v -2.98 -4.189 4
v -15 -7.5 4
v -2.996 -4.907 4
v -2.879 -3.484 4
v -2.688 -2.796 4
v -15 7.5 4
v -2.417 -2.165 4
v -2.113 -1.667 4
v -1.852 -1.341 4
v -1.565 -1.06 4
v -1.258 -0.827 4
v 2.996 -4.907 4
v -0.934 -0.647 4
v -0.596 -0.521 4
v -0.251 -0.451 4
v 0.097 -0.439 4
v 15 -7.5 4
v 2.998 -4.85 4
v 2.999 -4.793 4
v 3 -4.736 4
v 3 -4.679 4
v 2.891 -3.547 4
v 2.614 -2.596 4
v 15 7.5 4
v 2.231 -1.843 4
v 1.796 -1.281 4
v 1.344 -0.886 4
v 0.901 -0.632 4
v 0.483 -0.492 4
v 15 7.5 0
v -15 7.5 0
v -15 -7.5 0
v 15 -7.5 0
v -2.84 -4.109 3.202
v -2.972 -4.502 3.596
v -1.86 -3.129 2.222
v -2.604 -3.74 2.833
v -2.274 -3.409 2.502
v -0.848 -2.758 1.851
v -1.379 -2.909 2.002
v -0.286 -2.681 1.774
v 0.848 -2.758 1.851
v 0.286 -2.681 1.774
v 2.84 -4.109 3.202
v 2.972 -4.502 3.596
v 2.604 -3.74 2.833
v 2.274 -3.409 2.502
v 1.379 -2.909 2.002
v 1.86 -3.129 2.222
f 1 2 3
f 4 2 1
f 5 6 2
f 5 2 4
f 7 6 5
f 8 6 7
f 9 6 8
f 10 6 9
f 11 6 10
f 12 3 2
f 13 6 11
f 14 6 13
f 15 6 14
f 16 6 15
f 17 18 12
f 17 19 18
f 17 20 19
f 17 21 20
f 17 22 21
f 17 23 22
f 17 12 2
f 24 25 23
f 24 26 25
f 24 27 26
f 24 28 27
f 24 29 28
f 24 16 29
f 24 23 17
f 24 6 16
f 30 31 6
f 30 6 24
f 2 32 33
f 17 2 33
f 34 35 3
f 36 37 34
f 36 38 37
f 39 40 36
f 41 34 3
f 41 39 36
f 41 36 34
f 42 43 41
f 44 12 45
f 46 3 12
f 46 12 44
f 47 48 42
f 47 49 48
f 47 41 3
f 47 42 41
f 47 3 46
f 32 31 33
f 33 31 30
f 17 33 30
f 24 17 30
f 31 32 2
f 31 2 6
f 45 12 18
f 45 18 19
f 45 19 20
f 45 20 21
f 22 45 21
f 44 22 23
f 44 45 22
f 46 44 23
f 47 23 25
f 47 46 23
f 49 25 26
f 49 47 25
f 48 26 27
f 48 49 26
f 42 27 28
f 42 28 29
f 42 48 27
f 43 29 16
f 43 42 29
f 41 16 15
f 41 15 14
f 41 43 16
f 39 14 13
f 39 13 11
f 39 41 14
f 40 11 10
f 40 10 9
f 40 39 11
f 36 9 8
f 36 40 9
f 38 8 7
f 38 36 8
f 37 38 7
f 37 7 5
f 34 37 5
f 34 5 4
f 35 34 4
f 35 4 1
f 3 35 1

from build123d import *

# Parameters (mm, degrees)
F0_W     = 30
F0_H     = 15
F1_DEPTH = 4
F2_R     = 3
F3_DEPTH = 25
F4_ANGLE = 45


with BuildPart() as f1:
    # F0 (on Top) → F1 (new body)
    with BuildSketch(Plane.XY):
        Rectangle(F0_W, F0_H)
    extrude(amount=F1_DEPTH)


with BuildPart() as f3:
    # F2 (on Top) → F3 (new body)
    with BuildSketch(Plane.XY):
        with Locations((0, -2.5)):
            Circle(F2_R)
    extrude(amount=F3_DEPTH)


with BuildPart() as f3_1:
    # F4: moved
    add(f3.part.rotate(Axis((0, -7.5, 4), (-1, 0, 0)), F4_ANGLE))


with BuildPart() as f3_2:
    # F5: moved
    add(f3_1.part.moved(Location((0, 2, 6.25))))


with BuildPart() as f1_1:
    add(f1.part)

    # F6: cut F3
    add(f3_2.part, mode=Mode.SUBTRACT)


solid = f1_1.part
